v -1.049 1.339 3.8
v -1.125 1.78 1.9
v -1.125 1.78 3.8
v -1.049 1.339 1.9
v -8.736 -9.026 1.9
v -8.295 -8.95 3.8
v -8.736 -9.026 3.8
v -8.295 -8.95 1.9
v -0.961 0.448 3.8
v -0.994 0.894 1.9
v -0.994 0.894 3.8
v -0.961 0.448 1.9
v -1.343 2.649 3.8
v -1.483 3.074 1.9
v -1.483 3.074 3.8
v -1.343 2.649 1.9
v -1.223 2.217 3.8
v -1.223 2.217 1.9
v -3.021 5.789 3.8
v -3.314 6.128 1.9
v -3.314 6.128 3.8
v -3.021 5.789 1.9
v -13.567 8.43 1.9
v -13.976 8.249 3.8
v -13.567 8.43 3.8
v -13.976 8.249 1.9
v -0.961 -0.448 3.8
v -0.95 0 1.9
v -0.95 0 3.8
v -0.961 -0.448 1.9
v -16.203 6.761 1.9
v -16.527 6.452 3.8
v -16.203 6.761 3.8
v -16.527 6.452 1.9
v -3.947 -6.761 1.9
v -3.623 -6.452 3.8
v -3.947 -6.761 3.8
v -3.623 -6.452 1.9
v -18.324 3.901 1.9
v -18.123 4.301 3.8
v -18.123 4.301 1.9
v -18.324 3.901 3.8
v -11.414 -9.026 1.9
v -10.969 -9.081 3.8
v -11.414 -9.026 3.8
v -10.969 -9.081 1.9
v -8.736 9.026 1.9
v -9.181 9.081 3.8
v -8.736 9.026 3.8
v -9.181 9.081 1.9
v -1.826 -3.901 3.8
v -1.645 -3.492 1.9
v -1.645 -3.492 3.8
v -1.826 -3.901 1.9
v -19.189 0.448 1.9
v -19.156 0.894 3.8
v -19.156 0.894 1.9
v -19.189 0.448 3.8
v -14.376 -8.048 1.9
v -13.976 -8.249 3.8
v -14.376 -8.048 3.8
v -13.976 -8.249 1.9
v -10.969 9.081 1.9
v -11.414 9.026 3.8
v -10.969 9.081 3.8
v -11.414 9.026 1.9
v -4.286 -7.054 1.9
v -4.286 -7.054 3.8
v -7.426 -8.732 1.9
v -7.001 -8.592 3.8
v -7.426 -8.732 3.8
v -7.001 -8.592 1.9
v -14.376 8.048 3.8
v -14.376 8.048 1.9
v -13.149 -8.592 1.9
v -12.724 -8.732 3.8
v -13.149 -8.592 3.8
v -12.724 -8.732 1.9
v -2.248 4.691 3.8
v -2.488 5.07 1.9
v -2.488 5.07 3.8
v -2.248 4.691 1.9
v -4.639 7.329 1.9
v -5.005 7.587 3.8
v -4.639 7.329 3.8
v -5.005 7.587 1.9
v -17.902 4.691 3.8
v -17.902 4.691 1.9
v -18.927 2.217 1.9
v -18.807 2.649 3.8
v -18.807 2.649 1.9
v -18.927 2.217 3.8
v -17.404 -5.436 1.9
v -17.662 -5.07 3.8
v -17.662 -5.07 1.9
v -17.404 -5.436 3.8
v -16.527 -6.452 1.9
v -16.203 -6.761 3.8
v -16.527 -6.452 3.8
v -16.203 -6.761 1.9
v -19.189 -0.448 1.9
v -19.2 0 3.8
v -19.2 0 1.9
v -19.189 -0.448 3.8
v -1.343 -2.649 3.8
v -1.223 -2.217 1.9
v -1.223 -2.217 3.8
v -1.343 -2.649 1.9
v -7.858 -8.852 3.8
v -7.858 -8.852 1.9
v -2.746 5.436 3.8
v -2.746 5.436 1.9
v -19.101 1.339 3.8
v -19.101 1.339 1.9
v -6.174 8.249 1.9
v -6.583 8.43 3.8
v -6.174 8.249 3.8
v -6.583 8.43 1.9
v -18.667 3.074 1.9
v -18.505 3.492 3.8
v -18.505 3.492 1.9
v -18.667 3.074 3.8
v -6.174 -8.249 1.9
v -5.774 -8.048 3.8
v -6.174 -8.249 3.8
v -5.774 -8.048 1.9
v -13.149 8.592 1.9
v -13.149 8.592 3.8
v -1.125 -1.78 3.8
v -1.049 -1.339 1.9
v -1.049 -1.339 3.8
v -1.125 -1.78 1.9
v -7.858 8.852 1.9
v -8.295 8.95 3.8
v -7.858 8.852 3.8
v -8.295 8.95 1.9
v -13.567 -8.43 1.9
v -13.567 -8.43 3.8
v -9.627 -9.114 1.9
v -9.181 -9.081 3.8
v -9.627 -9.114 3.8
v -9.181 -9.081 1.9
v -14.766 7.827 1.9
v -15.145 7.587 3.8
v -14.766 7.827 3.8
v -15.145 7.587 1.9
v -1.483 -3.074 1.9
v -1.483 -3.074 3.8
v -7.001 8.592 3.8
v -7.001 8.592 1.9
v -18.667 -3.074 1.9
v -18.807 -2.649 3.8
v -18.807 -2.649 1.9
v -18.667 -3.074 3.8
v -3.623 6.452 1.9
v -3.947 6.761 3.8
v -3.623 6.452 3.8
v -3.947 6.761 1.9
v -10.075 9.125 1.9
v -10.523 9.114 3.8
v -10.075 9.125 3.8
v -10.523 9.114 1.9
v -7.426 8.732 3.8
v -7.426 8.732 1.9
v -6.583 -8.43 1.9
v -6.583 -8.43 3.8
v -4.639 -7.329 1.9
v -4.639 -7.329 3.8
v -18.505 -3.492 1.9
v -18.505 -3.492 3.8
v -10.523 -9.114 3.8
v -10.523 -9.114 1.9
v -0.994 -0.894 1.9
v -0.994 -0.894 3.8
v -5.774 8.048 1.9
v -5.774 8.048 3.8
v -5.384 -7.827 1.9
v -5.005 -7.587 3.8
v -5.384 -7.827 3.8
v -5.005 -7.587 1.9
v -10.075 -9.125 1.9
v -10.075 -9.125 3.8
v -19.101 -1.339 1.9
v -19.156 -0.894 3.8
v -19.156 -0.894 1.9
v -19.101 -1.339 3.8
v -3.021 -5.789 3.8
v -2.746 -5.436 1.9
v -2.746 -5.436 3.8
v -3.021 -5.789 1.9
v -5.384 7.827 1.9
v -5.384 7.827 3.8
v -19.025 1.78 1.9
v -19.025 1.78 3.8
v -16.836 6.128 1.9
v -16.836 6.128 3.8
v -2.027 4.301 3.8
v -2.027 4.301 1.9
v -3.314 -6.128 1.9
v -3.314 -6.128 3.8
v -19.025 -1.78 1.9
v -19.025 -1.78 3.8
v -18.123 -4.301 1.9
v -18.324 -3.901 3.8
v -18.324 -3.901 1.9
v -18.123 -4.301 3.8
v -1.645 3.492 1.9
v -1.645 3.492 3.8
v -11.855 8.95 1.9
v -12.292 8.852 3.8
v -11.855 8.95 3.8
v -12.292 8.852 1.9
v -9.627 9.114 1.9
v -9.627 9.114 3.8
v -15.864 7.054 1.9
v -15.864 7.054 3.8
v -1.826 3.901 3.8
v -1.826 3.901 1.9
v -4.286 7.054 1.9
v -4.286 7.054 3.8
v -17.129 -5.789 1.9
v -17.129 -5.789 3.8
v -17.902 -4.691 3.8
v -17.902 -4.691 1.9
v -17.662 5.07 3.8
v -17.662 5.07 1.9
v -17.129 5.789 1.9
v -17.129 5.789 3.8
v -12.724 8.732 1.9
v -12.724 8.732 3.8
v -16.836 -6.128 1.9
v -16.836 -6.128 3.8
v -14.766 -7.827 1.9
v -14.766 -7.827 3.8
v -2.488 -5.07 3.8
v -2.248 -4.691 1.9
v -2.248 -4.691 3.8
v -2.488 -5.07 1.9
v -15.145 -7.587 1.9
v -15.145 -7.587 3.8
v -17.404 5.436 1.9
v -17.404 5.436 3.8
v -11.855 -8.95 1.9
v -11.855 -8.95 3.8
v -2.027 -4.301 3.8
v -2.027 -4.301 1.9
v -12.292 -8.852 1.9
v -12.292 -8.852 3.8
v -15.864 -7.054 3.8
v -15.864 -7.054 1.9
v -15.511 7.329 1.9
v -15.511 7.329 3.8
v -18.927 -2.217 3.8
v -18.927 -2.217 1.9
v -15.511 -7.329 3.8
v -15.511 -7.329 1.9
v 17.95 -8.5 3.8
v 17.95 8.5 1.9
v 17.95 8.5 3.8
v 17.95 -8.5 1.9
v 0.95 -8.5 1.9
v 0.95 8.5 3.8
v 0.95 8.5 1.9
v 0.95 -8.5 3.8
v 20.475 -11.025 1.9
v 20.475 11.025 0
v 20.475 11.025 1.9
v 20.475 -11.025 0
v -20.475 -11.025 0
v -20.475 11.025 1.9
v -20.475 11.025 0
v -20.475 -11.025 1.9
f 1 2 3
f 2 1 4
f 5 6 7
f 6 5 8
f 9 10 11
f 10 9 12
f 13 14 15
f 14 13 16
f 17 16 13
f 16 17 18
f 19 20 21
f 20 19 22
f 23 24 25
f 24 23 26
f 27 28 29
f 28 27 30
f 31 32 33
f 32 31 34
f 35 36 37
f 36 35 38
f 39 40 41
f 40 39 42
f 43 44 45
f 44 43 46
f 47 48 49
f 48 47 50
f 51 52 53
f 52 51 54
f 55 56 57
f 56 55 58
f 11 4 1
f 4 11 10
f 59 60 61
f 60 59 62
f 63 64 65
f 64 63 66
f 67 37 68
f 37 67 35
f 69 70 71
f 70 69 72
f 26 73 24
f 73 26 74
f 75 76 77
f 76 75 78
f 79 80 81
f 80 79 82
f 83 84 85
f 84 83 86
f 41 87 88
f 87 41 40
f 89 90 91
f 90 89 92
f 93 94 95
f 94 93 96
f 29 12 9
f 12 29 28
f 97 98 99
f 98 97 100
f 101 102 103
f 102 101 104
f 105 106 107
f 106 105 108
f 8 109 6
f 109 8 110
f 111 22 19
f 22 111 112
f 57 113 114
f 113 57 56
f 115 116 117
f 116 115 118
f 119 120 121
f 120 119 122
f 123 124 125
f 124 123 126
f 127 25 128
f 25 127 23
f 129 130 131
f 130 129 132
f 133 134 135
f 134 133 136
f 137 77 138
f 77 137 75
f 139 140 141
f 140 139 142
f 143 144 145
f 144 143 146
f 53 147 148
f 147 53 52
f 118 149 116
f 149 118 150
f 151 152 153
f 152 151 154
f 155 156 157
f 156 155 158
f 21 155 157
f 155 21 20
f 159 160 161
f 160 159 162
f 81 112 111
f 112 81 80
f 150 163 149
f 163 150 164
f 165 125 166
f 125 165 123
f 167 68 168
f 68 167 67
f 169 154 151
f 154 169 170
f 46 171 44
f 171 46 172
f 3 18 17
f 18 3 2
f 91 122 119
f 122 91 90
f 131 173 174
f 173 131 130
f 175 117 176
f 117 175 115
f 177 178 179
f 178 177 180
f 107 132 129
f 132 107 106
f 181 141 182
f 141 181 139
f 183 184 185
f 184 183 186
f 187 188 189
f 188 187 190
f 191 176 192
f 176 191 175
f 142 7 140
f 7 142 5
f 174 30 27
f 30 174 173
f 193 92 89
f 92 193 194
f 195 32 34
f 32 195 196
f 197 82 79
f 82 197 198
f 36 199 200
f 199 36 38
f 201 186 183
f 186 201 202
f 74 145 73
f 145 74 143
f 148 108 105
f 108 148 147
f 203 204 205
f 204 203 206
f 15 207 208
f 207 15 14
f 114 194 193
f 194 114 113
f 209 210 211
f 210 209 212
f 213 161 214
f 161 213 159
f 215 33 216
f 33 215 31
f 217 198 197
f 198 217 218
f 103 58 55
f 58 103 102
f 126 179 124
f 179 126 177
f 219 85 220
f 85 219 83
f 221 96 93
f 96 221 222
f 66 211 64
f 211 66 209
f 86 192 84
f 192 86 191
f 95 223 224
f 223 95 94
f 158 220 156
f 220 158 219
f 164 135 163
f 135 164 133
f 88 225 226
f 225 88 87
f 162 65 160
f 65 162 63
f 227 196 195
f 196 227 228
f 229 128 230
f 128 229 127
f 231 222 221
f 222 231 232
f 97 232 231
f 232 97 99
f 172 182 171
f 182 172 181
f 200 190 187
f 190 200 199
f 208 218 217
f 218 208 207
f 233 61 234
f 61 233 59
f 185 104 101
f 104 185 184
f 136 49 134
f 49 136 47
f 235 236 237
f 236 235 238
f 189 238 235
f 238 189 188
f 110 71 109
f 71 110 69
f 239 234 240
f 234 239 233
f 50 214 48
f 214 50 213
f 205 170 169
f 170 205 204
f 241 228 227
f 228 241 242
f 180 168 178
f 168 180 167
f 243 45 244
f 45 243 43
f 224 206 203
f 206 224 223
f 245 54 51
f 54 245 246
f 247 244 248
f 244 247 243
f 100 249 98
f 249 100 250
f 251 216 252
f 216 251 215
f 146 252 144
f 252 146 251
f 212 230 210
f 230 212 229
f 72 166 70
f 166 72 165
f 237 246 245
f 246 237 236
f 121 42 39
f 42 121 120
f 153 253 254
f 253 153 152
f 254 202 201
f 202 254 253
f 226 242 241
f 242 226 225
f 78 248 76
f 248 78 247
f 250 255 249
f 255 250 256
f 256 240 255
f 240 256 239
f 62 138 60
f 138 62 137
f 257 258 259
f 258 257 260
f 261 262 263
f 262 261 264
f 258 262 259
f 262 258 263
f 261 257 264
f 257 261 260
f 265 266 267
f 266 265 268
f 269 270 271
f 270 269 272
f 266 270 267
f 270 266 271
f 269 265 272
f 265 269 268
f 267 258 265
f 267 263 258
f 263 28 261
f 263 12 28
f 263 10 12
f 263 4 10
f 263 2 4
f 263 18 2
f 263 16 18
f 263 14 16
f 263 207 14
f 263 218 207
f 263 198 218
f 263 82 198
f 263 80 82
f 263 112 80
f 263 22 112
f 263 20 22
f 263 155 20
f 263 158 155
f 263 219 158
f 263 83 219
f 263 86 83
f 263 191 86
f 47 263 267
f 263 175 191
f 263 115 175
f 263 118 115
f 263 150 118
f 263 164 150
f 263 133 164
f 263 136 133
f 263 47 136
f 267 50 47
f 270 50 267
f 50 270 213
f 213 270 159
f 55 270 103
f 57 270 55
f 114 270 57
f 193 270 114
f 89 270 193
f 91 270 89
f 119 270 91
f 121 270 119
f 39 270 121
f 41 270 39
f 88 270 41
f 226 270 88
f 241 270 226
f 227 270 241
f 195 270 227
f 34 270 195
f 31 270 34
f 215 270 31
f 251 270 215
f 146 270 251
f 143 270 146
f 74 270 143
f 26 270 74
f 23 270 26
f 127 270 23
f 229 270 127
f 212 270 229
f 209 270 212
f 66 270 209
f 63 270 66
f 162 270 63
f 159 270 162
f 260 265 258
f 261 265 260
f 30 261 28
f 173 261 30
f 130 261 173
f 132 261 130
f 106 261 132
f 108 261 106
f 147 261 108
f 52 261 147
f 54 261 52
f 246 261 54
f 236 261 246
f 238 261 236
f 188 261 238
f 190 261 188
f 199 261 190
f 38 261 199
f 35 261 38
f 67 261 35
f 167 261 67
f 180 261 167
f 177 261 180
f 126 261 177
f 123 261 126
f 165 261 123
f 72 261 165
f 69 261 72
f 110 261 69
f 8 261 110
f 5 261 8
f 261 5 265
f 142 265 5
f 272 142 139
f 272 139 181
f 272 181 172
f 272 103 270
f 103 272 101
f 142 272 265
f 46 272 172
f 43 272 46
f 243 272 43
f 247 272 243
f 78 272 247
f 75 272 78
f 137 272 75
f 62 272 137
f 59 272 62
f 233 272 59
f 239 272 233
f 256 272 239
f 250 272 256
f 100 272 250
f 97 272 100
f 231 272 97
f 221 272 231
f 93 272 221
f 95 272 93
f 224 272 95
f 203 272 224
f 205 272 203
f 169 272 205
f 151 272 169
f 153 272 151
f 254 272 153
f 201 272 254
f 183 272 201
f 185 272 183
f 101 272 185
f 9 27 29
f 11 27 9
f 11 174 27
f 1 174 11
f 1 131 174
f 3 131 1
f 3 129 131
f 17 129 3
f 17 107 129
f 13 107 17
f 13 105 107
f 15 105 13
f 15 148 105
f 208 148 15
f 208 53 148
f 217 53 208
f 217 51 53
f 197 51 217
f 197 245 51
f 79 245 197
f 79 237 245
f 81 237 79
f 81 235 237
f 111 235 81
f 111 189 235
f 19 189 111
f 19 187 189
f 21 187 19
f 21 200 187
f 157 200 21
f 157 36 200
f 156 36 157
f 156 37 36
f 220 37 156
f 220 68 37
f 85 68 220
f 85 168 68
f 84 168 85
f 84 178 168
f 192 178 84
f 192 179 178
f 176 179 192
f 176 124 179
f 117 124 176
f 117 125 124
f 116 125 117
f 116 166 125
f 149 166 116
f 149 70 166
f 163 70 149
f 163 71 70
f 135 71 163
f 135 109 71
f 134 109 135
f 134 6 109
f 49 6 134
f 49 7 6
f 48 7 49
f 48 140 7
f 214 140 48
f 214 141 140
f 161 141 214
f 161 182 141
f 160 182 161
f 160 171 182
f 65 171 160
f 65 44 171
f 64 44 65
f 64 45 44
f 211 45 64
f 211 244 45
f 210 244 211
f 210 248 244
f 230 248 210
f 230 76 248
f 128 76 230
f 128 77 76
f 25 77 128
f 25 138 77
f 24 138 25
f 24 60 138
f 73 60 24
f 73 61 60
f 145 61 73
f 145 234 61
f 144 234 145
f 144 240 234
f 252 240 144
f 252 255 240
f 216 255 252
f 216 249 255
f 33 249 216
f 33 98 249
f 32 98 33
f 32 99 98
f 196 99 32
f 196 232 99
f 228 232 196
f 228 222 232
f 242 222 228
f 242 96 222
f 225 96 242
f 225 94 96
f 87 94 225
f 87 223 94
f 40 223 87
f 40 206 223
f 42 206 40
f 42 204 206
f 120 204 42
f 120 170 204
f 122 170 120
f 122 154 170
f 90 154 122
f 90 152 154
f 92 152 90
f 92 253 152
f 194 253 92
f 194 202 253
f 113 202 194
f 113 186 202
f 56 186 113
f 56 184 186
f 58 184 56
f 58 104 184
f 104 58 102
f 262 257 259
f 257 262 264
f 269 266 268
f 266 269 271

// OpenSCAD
// file: ../common.scad
module ccube(dims) {
    translate([-dims[0]/2, -dims[1]/2, 0]) cube(dims);
}
// file: game-tokens-holder.scad
include <measurements.scad>

$fn = 128;

first_player_base_d = 18.25;
first_player_hips_d = 15;
first_player_neck_d = 8.5;
first_player_head_d = 13.25;
first_player_h = 38;
// The width of the dice holder exactly fits next to the ship box.
outer_w = 3*die_w+2*thickness;


dims = [
    [first_player_base_d,  0],
    [first_player_hips_d, 12],
    [first_player_head_d, 28],
    [first_player_head_d, first_player_h - first_player_head_d/2] // ish
];

module cone(bot, top) {
    translate([0, 0, bot[1]]) cylinder(d1=bot[0], d2=top[0], h=top[1] - bot[1]);
}

// Body
body_x = thickness + first_player_base_d + thickness + cube_w*2 + thickness;
body_y = first_player_base_d+2*thickness;
module body(h) {
    ccube([body_x, body_y, h]);
}

module first_player() {
    for (i = [0:len(dims)-2]) cone(dims[i], dims[i+1]);
    translate([0, 0, dims[len(dims)-1][1]]) sphere(d=dims[len(dims)-1][0]);
}

module cubes() {
    ccube([cube_w*2, cube_w*2, cube_w*3]);
}

module game_tokens_holder() {
    difference() {
        body(outer_w);
        // First player token
        translate([-first_player_base_d/2-thickness/2, 0, 0]) {
            translate([0, 0, thickness*2])
                first_player();
            cylinder(d=first_player_base_d, h=thickness*2+0.1);
        }
        translate([cube_w+thickness/2, 0, 0]) {
            translate([0, 0, thickness*2]) {
                // Round marker
                translate([0, 0, cube_w*3])
                    cylinder(d=round_d, h=round_h);
                // Damage cubes
                cubes();
            }
            ccube([cube_w*2, cube_w*2, thickness*2+0.1]);
        }
        // Volume for the lid
        ccube([body_x, body_y, thickness]);
    }
}

holder();
// file: measurements.scad
include <../common.scad>

thickness = 1.9;
finger_d = 22;

module holder(h) {
    // Child 0 is the outer shape
    // Child 1 is the inner shape
    // Child 2 is the end-cap hole shape
    // Bottom end
    difference() {
        linear_extrude(thickness) { children(0); }
        translate([0, 0, -1])
            linear_extrude(thickness+2) { children(2); }
    }
    // Main chamber: h + thickness to leave room for the lid.
    translate([0, 0, thickness])
        difference() {
            linear_extrude(h + thickness) { children(0); }
            translate([0, 0, -1])
                linear_extrude(h + thickness + 2) { children(1); }
        }
}

module lid() {
    // Child 0 is the outer shape
    // Child 1 is the inner shape
    // Child 2 is the end-cap hole shape
    // Bottom end
    difference() {
        linear_extrude(thickness) { children(0); }
        translate([0, 0, -1])
            linear_extrude(thickness+2) { children(2); }
    }
    // Cap plug
    translate([0, 0, thickness])
        difference() {
            linear_extrude(thickness) { children(1); }
            translate([0, 0, -1])
                linear_extrude(thickness+2) { children(2); }
        }
}

//
// Discovery Tiles
//

discovery_w = 24;
discovery_count = 21;

function discovery_corner_r(w) = w * 7 / 24;

module discovery_tile_shape(w) {
    r = discovery_corner_r(w);
    translate([-w/2, -w/2]) {
        translate([w-r, w-r])
            circle(r=r, $fn=64);
        square([w-r, w]);
        square([w, w-r]);
    }
}

//
// Ancients
//

ancient_r = 19.5;
ancient_count = 22;

//
// Monotliths/Orbitals
//

monolith_orbital_d = 25.25;
monolith_orbital_count = 22;

//
// Game Tokens
//

sector_w = 90;
sector_r = sector_w / (2 * cos(30));

cube_w = 8.5;

round_d = 15.5;
round_h = 10.1;

//
// Player Kit
//

pop_cube_count = 34;
influence_d = round_d;
influence_h = 5;
influence_count = 16;

//
// Combat Dice
//

die_w = 14.5;
// main file
include <measurements.scad>
use <game-tokens-holder.scad>


difference() {
    body(thickness*2);
    game_tokens_holder();
}
